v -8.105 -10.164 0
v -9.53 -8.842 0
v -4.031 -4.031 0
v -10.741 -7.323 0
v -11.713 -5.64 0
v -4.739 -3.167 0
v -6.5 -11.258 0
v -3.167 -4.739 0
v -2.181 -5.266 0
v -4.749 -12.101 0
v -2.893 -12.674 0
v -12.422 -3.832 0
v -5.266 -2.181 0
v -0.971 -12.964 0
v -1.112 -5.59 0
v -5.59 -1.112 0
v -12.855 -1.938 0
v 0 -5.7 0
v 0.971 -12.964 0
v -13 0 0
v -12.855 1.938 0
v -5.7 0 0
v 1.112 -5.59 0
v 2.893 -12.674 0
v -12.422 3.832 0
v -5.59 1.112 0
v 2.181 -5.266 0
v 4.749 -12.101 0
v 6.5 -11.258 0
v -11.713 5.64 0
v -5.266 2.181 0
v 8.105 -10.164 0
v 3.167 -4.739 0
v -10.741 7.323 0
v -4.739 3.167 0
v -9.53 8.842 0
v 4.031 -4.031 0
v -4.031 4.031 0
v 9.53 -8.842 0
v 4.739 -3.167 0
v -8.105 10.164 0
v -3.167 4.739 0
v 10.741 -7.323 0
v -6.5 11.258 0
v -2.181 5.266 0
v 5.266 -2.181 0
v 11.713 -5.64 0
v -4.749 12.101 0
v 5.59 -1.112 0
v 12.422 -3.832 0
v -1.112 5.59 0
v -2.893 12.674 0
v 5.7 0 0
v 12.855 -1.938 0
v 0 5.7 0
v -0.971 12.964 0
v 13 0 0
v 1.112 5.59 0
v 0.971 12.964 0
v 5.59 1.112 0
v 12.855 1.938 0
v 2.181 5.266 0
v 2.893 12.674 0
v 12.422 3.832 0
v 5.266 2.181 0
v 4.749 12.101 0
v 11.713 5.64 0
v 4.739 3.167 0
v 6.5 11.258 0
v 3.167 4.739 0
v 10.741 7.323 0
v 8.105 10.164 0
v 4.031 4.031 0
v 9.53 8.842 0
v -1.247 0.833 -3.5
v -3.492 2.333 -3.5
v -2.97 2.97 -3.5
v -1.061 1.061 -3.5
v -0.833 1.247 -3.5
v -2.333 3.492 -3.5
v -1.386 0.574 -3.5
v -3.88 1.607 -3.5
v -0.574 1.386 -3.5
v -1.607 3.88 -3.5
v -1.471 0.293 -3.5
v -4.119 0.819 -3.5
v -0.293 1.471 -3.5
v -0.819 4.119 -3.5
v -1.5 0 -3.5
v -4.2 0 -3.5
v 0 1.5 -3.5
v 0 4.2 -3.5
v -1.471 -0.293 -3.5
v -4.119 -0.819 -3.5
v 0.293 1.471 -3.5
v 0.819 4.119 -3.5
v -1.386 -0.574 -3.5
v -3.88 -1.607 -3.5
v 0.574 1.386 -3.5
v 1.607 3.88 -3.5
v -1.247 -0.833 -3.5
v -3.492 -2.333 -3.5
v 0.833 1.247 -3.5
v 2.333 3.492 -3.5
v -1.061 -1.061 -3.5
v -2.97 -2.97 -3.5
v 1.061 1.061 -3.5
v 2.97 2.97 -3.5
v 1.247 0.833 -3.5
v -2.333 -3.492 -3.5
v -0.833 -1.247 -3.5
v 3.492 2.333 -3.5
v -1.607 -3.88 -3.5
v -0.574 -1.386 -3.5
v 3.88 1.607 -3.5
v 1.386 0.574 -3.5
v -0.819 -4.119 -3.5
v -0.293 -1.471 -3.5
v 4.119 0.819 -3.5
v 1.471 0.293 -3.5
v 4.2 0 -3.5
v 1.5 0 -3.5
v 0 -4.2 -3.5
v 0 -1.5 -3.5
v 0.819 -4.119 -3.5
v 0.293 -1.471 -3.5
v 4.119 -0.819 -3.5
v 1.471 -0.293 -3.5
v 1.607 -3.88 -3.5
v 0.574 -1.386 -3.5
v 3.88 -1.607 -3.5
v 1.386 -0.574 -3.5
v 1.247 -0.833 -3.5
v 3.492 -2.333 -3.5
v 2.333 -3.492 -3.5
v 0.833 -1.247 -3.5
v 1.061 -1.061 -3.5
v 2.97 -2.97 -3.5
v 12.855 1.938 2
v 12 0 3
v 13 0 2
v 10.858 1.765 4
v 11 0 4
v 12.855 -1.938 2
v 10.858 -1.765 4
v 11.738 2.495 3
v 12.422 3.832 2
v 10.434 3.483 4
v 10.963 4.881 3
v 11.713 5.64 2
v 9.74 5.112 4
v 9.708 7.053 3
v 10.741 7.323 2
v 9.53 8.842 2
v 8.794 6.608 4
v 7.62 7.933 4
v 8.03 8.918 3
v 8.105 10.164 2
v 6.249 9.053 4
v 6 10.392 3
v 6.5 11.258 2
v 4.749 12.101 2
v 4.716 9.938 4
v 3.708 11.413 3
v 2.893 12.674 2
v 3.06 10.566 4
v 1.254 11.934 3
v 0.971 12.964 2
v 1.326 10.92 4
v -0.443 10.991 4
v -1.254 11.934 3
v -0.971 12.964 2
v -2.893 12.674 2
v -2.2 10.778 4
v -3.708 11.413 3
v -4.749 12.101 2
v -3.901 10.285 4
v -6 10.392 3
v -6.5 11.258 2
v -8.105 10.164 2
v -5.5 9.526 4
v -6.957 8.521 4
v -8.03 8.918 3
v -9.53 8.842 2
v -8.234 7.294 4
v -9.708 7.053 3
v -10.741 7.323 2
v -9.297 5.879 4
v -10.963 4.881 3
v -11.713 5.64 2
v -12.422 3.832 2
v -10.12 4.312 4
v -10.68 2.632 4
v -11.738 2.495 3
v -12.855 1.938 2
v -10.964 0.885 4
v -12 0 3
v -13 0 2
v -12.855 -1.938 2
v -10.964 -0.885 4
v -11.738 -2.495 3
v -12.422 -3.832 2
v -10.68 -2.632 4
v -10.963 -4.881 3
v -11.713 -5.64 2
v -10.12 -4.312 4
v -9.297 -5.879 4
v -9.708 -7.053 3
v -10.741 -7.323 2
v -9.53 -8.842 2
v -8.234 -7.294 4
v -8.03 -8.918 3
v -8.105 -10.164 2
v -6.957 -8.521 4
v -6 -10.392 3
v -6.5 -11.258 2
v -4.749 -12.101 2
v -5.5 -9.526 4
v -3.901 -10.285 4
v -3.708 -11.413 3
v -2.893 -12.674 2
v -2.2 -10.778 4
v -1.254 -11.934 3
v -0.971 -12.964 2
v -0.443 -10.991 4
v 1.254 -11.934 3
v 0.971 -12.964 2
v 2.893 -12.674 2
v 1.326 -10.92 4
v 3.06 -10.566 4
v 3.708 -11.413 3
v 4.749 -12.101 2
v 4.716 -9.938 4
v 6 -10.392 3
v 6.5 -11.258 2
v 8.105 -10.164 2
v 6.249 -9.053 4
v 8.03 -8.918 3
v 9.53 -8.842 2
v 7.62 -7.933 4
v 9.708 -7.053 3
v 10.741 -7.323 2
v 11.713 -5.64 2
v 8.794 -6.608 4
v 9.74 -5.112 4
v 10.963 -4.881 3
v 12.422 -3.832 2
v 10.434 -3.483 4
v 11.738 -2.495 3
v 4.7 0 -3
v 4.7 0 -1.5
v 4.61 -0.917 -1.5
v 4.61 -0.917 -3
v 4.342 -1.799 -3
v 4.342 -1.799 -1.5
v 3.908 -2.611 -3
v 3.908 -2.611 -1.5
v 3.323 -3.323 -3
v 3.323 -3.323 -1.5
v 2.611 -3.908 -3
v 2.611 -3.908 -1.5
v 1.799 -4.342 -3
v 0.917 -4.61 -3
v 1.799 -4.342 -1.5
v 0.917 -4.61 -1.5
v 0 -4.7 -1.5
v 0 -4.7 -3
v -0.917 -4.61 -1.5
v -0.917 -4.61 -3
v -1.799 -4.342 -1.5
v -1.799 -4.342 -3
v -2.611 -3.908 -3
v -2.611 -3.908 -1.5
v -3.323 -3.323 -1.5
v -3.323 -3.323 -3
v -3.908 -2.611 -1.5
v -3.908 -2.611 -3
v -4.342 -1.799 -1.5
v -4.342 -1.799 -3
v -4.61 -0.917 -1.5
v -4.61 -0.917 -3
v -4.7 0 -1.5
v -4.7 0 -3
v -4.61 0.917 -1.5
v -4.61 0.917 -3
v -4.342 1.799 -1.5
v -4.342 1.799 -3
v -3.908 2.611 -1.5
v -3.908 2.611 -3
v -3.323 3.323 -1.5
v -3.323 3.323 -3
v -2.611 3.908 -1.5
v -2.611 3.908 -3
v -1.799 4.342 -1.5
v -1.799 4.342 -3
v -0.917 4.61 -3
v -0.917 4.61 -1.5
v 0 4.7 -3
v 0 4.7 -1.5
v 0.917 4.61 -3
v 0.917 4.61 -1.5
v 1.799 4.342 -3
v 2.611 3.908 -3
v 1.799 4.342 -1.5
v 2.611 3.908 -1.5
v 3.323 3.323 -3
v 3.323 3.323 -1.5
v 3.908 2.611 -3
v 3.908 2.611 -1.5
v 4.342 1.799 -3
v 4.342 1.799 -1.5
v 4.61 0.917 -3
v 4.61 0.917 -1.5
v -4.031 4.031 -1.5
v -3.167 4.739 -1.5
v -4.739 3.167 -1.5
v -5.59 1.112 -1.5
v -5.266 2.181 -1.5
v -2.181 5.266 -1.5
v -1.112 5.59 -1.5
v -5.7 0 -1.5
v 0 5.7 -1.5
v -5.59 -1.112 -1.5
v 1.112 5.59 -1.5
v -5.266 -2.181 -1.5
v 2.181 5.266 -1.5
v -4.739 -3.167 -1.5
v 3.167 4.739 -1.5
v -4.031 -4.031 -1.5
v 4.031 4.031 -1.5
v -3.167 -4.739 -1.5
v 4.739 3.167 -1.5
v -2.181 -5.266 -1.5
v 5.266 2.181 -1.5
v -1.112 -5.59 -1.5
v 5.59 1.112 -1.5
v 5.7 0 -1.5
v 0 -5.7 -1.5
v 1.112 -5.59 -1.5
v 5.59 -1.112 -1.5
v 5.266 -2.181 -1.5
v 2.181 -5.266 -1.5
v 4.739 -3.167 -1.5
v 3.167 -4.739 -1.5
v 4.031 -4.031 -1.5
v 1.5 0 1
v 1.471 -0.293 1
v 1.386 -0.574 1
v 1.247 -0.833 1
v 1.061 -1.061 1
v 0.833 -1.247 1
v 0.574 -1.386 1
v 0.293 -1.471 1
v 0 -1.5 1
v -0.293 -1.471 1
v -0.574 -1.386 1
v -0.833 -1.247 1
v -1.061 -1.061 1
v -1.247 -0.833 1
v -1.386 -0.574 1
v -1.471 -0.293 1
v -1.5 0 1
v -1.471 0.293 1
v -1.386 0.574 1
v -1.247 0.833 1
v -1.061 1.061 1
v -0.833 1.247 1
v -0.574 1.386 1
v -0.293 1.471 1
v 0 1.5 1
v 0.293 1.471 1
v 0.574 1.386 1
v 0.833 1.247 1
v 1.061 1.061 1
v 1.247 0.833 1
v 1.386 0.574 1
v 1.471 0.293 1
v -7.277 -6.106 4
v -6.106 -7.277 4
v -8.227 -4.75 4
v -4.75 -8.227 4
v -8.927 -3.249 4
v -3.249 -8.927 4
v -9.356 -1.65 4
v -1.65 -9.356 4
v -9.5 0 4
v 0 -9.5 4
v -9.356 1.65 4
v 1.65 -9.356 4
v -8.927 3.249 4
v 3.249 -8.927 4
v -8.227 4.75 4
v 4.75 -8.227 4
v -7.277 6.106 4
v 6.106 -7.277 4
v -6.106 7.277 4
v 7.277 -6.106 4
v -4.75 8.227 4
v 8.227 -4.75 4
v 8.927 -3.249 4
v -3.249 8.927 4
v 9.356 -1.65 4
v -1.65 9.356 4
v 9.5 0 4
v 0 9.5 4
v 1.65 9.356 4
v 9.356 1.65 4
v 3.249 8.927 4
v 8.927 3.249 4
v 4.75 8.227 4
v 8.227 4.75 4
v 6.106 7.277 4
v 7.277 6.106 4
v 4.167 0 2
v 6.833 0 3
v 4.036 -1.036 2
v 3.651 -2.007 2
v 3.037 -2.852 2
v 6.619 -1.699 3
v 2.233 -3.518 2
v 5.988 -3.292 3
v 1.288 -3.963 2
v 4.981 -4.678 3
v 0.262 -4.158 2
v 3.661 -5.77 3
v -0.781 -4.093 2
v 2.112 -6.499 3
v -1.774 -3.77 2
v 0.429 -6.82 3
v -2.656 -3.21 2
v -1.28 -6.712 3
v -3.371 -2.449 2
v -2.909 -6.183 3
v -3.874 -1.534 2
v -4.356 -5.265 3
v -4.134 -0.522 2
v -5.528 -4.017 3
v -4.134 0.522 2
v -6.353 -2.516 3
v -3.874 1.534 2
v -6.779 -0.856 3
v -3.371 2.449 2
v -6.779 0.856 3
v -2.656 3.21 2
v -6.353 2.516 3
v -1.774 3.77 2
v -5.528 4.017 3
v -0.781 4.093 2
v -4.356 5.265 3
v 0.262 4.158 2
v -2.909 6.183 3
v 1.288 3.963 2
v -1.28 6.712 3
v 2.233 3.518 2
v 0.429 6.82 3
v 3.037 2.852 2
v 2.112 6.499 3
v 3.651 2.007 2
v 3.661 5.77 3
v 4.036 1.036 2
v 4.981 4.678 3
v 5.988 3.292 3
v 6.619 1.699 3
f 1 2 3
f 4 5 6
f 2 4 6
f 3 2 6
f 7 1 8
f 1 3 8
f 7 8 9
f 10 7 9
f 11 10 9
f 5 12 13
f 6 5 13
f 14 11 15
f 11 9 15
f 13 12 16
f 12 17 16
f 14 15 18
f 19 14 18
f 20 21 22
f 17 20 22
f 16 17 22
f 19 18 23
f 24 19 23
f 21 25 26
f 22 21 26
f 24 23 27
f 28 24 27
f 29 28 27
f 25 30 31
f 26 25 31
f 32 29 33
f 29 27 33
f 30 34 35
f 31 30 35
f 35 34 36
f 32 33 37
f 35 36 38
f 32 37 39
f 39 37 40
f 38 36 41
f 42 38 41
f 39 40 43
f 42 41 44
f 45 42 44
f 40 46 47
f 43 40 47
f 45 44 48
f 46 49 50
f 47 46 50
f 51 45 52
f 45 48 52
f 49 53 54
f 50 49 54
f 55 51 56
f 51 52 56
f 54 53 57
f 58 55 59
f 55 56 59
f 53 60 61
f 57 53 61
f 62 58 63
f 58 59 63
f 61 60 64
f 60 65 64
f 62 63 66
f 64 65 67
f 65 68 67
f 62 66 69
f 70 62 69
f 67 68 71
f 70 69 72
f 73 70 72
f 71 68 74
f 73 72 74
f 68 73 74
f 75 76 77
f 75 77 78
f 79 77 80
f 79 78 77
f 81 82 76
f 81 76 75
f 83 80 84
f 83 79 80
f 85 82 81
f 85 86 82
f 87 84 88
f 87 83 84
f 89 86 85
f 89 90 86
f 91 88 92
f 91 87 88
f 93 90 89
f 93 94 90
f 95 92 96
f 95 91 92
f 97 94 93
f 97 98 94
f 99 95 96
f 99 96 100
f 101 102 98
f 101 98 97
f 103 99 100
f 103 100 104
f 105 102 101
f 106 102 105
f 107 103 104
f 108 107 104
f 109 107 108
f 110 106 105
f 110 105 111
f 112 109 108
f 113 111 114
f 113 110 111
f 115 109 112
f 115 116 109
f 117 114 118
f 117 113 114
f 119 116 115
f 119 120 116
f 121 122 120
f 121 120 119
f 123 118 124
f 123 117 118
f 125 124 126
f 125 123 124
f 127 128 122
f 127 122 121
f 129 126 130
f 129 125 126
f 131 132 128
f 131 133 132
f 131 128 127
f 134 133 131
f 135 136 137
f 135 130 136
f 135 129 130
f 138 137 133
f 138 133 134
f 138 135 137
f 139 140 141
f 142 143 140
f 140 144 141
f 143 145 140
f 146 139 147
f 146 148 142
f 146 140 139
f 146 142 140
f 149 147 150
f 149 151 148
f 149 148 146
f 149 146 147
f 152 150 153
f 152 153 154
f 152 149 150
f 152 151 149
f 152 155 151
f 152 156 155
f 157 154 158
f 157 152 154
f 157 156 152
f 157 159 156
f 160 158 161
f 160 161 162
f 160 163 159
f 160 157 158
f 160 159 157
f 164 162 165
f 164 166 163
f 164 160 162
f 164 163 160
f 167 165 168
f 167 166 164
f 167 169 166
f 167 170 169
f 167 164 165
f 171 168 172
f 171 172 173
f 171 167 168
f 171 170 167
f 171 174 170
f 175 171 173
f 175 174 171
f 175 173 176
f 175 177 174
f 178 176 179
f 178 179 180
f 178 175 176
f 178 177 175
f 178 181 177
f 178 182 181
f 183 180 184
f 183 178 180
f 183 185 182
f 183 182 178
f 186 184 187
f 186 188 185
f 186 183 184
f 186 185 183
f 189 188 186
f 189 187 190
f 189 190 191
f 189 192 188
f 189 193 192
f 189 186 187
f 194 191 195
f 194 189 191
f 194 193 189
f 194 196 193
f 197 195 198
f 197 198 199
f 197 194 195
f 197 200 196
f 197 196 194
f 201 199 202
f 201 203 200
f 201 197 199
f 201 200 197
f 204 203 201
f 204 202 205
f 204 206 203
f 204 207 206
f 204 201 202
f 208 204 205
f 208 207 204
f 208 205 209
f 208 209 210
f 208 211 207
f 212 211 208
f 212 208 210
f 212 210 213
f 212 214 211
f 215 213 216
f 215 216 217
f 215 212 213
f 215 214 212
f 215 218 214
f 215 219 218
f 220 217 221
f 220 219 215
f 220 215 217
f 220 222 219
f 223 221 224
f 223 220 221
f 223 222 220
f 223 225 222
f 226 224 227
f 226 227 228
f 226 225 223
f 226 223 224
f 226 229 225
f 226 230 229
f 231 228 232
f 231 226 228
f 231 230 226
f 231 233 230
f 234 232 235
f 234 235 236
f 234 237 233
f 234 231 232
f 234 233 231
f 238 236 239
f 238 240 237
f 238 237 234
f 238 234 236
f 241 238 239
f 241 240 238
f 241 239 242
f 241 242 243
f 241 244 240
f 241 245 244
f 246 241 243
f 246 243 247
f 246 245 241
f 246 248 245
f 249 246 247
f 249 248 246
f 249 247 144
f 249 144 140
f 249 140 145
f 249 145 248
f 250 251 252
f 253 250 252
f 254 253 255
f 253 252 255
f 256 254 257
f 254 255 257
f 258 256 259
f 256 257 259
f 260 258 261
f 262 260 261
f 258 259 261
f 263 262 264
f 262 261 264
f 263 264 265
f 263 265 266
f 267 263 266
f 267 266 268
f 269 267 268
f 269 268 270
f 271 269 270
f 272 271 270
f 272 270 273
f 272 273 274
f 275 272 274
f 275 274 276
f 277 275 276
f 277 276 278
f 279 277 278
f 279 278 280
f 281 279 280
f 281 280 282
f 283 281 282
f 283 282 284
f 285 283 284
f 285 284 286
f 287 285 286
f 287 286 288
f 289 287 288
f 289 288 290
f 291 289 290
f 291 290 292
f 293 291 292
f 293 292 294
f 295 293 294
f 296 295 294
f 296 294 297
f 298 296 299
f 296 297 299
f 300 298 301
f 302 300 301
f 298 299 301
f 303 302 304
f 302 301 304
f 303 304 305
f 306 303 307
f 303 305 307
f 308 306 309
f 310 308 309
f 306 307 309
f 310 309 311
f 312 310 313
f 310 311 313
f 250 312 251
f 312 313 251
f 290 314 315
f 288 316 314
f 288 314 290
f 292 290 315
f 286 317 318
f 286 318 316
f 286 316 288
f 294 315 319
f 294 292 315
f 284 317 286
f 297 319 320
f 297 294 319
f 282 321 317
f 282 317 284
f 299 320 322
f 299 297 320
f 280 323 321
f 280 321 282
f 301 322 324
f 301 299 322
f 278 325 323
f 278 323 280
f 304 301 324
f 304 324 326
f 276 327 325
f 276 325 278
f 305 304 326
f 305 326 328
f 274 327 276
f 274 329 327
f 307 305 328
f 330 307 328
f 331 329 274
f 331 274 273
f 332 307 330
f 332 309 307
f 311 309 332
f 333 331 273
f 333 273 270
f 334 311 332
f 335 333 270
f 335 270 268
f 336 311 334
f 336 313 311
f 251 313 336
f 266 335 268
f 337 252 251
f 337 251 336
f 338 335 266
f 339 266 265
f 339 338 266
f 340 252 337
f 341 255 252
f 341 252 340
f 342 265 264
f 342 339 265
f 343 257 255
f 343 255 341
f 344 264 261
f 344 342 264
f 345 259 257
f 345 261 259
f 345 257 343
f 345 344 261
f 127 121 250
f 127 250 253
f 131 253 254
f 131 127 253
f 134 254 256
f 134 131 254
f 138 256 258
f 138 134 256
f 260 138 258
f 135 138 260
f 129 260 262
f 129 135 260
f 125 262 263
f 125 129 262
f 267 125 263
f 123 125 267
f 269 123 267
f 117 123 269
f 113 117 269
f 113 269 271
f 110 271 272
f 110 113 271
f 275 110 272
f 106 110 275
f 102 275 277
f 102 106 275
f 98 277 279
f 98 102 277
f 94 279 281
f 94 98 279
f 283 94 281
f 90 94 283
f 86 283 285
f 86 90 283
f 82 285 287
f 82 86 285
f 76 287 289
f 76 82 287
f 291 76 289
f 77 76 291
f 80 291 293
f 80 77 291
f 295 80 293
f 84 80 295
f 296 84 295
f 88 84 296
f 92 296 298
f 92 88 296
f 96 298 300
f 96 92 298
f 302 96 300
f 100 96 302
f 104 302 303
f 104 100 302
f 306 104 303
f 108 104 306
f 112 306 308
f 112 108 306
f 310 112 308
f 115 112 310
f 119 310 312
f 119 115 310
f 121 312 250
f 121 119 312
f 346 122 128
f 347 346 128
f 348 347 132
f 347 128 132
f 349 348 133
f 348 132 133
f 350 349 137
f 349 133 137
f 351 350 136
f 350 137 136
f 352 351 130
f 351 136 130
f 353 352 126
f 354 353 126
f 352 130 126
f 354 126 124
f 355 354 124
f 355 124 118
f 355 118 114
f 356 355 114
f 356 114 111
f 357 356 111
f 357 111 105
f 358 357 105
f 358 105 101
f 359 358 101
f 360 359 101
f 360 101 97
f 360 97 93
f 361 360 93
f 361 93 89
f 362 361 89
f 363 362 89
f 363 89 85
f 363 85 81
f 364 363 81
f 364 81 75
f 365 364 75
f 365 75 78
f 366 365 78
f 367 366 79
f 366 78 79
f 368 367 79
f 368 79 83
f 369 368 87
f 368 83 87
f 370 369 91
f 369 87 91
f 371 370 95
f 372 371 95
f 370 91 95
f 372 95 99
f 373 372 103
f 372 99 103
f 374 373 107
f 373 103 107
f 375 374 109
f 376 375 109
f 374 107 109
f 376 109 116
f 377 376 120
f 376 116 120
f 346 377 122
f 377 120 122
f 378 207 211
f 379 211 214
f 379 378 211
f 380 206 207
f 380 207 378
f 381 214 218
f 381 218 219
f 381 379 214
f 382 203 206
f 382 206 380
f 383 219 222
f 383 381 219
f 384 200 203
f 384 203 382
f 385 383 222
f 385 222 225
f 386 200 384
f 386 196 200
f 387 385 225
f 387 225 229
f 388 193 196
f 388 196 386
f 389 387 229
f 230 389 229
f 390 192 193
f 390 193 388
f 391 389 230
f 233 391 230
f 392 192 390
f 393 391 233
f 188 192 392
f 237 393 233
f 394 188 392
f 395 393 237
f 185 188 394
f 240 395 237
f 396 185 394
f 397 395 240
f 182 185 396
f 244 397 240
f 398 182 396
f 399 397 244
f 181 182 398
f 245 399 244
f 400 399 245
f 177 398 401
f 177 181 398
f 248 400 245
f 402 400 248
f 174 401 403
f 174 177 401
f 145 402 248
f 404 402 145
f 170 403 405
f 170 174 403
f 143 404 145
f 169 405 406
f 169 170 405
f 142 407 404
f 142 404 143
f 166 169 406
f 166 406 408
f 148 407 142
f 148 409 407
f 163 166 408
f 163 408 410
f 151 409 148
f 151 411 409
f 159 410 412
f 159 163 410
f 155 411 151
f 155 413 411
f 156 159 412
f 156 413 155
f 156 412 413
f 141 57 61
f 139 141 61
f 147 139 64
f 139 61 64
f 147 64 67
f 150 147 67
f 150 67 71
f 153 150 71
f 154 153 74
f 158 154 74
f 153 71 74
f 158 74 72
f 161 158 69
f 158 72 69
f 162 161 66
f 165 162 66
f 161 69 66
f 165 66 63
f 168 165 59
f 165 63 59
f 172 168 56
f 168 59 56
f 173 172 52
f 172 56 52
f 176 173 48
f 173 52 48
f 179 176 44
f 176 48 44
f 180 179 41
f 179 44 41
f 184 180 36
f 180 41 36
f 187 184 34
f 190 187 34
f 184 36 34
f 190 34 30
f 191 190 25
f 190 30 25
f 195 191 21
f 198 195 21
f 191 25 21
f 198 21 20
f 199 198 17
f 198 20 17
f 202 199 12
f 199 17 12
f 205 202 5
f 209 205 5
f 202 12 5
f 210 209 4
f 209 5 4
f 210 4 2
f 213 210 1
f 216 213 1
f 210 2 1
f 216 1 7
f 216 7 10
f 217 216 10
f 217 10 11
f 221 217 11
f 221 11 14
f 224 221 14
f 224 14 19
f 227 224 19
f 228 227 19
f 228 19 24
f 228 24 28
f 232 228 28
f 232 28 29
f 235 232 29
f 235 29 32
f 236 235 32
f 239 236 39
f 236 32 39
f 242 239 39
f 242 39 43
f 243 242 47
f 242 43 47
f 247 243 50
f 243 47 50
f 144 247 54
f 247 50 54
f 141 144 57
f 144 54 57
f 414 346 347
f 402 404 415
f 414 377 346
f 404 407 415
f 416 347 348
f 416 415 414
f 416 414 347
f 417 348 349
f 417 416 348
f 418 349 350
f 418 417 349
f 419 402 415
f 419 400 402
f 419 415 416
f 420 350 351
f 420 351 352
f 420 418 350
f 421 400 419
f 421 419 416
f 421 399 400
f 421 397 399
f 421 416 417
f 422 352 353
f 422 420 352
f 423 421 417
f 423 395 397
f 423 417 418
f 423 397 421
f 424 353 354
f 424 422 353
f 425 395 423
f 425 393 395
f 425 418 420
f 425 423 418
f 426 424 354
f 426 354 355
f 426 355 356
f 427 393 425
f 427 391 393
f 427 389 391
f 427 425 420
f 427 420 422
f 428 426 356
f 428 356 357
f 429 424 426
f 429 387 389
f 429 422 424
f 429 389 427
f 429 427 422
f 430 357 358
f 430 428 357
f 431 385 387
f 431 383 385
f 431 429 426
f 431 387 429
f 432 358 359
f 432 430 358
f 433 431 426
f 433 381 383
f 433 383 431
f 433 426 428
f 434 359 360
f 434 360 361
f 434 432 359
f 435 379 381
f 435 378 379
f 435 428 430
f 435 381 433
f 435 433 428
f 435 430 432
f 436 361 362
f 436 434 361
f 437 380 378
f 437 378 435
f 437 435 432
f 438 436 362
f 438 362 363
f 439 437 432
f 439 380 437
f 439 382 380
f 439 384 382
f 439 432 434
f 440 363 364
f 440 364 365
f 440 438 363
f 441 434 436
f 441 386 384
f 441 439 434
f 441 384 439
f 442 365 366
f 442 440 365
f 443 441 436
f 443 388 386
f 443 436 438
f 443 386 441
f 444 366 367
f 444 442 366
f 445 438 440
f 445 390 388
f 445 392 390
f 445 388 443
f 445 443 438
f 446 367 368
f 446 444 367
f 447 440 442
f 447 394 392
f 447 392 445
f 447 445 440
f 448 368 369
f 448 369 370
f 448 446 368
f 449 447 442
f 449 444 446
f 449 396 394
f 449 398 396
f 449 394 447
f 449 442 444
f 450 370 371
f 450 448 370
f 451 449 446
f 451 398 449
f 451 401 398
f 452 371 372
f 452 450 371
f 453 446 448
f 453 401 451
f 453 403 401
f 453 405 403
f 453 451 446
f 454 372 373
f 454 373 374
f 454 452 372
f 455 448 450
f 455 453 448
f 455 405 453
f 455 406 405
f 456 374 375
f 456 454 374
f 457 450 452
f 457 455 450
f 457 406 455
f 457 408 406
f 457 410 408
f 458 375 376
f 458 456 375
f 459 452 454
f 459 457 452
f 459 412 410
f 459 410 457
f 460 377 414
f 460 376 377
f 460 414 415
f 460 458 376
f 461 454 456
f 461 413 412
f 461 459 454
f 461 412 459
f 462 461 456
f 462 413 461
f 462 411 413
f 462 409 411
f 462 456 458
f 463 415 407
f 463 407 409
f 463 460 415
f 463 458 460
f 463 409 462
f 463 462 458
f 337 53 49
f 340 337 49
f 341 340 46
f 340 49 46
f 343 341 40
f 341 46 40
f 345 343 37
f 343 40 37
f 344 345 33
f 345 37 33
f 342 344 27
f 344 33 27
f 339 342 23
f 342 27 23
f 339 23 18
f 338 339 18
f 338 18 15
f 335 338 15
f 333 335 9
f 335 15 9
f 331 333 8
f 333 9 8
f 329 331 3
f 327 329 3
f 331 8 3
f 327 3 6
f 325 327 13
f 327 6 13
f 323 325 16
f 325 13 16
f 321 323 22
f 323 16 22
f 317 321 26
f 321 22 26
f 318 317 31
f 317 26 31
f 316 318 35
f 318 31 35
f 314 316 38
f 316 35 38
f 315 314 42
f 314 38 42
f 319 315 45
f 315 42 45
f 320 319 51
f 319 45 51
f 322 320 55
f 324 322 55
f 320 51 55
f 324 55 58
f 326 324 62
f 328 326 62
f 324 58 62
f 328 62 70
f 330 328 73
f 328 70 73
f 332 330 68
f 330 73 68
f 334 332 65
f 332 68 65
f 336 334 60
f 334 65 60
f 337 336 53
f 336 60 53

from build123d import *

# Parameters (mm, degrees)
F0_R     = 13
F1_DEPTH = 4
F2_SIZE  = 2
F3_R     = 4.7
F4_DEPTH = 3.5
F5_SIZE  = 0.5
F6_R     = 1.5
F7_DEPTH = 25
F8_R     = 5.7
F8_R_2   = 4.7
F9_DEPTH = 1.5


# Not quite as in the source:
# - a fillet or chamfer that OpenCascade refuses, or shapes differently, is made with other operations: its cross-section is extruded or revolved along the edge and cut away or added


with BuildPart() as f1:
    # F0 (on Top) → F1 (new body)
    with BuildSketch(Plane.XY):
        Circle(F0_R)
    extrude(amount=F1_DEPTH)

    # F2
    f2_edges = [f1.edges().sort_by_distance(p)[0] for p in [
        (-13, 0, 4),
    ]]
    chamfer(f2_edges, length=F2_SIZE)

    # F3 (on face) → F4 (join)
    with BuildSketch(Plane(origin=(0, 0, 0), x_dir=(1, 0, 0), z_dir=(0, 0, -1))):
        Circle(F3_R)
    extrude(amount=F4_DEPTH)

    # F5
    f5_edges = [f1.edges().sort_by_distance(p)[0] for p in [
        (-4.7, 0, -3.5),
    ]]
    chamfer(f5_edges, length=F5_SIZE)

    # F6 (on face) → F7 (cut)
    with BuildSketch(Plane(origin=(0, 0, -3.5), x_dir=(1, 0, 0), z_dir=(0, 0, -1))):
        Circle(F6_R)
    extrude(amount=-F7_DEPTH, mode=Mode.SUBTRACT)

    # F8 (on face) → F9 (join)
    with BuildSketch(Plane(origin=(0, 0, 0), x_dir=(1, 0, 0), z_dir=(0, 0, -1))):
        Circle(F8_R)
        Circle(F8_R_2, mode=Mode.SUBTRACT)
    extrude(amount=F9_DEPTH)

    # F10: chamfer of 3 x 8 on 1 edges, made by hand

    # F10_s1 → F10_t2 (revolve, cut)
    with BuildSketch(Plane.XZ):
        Polygon((1.5, 1), (9.5, 4), (1.5, 4), align=None)
    revolve(axis=Axis((0, 0, 4), (0, 0, -1)), mode=Mode.SUBTRACT)


solid = f1.part
